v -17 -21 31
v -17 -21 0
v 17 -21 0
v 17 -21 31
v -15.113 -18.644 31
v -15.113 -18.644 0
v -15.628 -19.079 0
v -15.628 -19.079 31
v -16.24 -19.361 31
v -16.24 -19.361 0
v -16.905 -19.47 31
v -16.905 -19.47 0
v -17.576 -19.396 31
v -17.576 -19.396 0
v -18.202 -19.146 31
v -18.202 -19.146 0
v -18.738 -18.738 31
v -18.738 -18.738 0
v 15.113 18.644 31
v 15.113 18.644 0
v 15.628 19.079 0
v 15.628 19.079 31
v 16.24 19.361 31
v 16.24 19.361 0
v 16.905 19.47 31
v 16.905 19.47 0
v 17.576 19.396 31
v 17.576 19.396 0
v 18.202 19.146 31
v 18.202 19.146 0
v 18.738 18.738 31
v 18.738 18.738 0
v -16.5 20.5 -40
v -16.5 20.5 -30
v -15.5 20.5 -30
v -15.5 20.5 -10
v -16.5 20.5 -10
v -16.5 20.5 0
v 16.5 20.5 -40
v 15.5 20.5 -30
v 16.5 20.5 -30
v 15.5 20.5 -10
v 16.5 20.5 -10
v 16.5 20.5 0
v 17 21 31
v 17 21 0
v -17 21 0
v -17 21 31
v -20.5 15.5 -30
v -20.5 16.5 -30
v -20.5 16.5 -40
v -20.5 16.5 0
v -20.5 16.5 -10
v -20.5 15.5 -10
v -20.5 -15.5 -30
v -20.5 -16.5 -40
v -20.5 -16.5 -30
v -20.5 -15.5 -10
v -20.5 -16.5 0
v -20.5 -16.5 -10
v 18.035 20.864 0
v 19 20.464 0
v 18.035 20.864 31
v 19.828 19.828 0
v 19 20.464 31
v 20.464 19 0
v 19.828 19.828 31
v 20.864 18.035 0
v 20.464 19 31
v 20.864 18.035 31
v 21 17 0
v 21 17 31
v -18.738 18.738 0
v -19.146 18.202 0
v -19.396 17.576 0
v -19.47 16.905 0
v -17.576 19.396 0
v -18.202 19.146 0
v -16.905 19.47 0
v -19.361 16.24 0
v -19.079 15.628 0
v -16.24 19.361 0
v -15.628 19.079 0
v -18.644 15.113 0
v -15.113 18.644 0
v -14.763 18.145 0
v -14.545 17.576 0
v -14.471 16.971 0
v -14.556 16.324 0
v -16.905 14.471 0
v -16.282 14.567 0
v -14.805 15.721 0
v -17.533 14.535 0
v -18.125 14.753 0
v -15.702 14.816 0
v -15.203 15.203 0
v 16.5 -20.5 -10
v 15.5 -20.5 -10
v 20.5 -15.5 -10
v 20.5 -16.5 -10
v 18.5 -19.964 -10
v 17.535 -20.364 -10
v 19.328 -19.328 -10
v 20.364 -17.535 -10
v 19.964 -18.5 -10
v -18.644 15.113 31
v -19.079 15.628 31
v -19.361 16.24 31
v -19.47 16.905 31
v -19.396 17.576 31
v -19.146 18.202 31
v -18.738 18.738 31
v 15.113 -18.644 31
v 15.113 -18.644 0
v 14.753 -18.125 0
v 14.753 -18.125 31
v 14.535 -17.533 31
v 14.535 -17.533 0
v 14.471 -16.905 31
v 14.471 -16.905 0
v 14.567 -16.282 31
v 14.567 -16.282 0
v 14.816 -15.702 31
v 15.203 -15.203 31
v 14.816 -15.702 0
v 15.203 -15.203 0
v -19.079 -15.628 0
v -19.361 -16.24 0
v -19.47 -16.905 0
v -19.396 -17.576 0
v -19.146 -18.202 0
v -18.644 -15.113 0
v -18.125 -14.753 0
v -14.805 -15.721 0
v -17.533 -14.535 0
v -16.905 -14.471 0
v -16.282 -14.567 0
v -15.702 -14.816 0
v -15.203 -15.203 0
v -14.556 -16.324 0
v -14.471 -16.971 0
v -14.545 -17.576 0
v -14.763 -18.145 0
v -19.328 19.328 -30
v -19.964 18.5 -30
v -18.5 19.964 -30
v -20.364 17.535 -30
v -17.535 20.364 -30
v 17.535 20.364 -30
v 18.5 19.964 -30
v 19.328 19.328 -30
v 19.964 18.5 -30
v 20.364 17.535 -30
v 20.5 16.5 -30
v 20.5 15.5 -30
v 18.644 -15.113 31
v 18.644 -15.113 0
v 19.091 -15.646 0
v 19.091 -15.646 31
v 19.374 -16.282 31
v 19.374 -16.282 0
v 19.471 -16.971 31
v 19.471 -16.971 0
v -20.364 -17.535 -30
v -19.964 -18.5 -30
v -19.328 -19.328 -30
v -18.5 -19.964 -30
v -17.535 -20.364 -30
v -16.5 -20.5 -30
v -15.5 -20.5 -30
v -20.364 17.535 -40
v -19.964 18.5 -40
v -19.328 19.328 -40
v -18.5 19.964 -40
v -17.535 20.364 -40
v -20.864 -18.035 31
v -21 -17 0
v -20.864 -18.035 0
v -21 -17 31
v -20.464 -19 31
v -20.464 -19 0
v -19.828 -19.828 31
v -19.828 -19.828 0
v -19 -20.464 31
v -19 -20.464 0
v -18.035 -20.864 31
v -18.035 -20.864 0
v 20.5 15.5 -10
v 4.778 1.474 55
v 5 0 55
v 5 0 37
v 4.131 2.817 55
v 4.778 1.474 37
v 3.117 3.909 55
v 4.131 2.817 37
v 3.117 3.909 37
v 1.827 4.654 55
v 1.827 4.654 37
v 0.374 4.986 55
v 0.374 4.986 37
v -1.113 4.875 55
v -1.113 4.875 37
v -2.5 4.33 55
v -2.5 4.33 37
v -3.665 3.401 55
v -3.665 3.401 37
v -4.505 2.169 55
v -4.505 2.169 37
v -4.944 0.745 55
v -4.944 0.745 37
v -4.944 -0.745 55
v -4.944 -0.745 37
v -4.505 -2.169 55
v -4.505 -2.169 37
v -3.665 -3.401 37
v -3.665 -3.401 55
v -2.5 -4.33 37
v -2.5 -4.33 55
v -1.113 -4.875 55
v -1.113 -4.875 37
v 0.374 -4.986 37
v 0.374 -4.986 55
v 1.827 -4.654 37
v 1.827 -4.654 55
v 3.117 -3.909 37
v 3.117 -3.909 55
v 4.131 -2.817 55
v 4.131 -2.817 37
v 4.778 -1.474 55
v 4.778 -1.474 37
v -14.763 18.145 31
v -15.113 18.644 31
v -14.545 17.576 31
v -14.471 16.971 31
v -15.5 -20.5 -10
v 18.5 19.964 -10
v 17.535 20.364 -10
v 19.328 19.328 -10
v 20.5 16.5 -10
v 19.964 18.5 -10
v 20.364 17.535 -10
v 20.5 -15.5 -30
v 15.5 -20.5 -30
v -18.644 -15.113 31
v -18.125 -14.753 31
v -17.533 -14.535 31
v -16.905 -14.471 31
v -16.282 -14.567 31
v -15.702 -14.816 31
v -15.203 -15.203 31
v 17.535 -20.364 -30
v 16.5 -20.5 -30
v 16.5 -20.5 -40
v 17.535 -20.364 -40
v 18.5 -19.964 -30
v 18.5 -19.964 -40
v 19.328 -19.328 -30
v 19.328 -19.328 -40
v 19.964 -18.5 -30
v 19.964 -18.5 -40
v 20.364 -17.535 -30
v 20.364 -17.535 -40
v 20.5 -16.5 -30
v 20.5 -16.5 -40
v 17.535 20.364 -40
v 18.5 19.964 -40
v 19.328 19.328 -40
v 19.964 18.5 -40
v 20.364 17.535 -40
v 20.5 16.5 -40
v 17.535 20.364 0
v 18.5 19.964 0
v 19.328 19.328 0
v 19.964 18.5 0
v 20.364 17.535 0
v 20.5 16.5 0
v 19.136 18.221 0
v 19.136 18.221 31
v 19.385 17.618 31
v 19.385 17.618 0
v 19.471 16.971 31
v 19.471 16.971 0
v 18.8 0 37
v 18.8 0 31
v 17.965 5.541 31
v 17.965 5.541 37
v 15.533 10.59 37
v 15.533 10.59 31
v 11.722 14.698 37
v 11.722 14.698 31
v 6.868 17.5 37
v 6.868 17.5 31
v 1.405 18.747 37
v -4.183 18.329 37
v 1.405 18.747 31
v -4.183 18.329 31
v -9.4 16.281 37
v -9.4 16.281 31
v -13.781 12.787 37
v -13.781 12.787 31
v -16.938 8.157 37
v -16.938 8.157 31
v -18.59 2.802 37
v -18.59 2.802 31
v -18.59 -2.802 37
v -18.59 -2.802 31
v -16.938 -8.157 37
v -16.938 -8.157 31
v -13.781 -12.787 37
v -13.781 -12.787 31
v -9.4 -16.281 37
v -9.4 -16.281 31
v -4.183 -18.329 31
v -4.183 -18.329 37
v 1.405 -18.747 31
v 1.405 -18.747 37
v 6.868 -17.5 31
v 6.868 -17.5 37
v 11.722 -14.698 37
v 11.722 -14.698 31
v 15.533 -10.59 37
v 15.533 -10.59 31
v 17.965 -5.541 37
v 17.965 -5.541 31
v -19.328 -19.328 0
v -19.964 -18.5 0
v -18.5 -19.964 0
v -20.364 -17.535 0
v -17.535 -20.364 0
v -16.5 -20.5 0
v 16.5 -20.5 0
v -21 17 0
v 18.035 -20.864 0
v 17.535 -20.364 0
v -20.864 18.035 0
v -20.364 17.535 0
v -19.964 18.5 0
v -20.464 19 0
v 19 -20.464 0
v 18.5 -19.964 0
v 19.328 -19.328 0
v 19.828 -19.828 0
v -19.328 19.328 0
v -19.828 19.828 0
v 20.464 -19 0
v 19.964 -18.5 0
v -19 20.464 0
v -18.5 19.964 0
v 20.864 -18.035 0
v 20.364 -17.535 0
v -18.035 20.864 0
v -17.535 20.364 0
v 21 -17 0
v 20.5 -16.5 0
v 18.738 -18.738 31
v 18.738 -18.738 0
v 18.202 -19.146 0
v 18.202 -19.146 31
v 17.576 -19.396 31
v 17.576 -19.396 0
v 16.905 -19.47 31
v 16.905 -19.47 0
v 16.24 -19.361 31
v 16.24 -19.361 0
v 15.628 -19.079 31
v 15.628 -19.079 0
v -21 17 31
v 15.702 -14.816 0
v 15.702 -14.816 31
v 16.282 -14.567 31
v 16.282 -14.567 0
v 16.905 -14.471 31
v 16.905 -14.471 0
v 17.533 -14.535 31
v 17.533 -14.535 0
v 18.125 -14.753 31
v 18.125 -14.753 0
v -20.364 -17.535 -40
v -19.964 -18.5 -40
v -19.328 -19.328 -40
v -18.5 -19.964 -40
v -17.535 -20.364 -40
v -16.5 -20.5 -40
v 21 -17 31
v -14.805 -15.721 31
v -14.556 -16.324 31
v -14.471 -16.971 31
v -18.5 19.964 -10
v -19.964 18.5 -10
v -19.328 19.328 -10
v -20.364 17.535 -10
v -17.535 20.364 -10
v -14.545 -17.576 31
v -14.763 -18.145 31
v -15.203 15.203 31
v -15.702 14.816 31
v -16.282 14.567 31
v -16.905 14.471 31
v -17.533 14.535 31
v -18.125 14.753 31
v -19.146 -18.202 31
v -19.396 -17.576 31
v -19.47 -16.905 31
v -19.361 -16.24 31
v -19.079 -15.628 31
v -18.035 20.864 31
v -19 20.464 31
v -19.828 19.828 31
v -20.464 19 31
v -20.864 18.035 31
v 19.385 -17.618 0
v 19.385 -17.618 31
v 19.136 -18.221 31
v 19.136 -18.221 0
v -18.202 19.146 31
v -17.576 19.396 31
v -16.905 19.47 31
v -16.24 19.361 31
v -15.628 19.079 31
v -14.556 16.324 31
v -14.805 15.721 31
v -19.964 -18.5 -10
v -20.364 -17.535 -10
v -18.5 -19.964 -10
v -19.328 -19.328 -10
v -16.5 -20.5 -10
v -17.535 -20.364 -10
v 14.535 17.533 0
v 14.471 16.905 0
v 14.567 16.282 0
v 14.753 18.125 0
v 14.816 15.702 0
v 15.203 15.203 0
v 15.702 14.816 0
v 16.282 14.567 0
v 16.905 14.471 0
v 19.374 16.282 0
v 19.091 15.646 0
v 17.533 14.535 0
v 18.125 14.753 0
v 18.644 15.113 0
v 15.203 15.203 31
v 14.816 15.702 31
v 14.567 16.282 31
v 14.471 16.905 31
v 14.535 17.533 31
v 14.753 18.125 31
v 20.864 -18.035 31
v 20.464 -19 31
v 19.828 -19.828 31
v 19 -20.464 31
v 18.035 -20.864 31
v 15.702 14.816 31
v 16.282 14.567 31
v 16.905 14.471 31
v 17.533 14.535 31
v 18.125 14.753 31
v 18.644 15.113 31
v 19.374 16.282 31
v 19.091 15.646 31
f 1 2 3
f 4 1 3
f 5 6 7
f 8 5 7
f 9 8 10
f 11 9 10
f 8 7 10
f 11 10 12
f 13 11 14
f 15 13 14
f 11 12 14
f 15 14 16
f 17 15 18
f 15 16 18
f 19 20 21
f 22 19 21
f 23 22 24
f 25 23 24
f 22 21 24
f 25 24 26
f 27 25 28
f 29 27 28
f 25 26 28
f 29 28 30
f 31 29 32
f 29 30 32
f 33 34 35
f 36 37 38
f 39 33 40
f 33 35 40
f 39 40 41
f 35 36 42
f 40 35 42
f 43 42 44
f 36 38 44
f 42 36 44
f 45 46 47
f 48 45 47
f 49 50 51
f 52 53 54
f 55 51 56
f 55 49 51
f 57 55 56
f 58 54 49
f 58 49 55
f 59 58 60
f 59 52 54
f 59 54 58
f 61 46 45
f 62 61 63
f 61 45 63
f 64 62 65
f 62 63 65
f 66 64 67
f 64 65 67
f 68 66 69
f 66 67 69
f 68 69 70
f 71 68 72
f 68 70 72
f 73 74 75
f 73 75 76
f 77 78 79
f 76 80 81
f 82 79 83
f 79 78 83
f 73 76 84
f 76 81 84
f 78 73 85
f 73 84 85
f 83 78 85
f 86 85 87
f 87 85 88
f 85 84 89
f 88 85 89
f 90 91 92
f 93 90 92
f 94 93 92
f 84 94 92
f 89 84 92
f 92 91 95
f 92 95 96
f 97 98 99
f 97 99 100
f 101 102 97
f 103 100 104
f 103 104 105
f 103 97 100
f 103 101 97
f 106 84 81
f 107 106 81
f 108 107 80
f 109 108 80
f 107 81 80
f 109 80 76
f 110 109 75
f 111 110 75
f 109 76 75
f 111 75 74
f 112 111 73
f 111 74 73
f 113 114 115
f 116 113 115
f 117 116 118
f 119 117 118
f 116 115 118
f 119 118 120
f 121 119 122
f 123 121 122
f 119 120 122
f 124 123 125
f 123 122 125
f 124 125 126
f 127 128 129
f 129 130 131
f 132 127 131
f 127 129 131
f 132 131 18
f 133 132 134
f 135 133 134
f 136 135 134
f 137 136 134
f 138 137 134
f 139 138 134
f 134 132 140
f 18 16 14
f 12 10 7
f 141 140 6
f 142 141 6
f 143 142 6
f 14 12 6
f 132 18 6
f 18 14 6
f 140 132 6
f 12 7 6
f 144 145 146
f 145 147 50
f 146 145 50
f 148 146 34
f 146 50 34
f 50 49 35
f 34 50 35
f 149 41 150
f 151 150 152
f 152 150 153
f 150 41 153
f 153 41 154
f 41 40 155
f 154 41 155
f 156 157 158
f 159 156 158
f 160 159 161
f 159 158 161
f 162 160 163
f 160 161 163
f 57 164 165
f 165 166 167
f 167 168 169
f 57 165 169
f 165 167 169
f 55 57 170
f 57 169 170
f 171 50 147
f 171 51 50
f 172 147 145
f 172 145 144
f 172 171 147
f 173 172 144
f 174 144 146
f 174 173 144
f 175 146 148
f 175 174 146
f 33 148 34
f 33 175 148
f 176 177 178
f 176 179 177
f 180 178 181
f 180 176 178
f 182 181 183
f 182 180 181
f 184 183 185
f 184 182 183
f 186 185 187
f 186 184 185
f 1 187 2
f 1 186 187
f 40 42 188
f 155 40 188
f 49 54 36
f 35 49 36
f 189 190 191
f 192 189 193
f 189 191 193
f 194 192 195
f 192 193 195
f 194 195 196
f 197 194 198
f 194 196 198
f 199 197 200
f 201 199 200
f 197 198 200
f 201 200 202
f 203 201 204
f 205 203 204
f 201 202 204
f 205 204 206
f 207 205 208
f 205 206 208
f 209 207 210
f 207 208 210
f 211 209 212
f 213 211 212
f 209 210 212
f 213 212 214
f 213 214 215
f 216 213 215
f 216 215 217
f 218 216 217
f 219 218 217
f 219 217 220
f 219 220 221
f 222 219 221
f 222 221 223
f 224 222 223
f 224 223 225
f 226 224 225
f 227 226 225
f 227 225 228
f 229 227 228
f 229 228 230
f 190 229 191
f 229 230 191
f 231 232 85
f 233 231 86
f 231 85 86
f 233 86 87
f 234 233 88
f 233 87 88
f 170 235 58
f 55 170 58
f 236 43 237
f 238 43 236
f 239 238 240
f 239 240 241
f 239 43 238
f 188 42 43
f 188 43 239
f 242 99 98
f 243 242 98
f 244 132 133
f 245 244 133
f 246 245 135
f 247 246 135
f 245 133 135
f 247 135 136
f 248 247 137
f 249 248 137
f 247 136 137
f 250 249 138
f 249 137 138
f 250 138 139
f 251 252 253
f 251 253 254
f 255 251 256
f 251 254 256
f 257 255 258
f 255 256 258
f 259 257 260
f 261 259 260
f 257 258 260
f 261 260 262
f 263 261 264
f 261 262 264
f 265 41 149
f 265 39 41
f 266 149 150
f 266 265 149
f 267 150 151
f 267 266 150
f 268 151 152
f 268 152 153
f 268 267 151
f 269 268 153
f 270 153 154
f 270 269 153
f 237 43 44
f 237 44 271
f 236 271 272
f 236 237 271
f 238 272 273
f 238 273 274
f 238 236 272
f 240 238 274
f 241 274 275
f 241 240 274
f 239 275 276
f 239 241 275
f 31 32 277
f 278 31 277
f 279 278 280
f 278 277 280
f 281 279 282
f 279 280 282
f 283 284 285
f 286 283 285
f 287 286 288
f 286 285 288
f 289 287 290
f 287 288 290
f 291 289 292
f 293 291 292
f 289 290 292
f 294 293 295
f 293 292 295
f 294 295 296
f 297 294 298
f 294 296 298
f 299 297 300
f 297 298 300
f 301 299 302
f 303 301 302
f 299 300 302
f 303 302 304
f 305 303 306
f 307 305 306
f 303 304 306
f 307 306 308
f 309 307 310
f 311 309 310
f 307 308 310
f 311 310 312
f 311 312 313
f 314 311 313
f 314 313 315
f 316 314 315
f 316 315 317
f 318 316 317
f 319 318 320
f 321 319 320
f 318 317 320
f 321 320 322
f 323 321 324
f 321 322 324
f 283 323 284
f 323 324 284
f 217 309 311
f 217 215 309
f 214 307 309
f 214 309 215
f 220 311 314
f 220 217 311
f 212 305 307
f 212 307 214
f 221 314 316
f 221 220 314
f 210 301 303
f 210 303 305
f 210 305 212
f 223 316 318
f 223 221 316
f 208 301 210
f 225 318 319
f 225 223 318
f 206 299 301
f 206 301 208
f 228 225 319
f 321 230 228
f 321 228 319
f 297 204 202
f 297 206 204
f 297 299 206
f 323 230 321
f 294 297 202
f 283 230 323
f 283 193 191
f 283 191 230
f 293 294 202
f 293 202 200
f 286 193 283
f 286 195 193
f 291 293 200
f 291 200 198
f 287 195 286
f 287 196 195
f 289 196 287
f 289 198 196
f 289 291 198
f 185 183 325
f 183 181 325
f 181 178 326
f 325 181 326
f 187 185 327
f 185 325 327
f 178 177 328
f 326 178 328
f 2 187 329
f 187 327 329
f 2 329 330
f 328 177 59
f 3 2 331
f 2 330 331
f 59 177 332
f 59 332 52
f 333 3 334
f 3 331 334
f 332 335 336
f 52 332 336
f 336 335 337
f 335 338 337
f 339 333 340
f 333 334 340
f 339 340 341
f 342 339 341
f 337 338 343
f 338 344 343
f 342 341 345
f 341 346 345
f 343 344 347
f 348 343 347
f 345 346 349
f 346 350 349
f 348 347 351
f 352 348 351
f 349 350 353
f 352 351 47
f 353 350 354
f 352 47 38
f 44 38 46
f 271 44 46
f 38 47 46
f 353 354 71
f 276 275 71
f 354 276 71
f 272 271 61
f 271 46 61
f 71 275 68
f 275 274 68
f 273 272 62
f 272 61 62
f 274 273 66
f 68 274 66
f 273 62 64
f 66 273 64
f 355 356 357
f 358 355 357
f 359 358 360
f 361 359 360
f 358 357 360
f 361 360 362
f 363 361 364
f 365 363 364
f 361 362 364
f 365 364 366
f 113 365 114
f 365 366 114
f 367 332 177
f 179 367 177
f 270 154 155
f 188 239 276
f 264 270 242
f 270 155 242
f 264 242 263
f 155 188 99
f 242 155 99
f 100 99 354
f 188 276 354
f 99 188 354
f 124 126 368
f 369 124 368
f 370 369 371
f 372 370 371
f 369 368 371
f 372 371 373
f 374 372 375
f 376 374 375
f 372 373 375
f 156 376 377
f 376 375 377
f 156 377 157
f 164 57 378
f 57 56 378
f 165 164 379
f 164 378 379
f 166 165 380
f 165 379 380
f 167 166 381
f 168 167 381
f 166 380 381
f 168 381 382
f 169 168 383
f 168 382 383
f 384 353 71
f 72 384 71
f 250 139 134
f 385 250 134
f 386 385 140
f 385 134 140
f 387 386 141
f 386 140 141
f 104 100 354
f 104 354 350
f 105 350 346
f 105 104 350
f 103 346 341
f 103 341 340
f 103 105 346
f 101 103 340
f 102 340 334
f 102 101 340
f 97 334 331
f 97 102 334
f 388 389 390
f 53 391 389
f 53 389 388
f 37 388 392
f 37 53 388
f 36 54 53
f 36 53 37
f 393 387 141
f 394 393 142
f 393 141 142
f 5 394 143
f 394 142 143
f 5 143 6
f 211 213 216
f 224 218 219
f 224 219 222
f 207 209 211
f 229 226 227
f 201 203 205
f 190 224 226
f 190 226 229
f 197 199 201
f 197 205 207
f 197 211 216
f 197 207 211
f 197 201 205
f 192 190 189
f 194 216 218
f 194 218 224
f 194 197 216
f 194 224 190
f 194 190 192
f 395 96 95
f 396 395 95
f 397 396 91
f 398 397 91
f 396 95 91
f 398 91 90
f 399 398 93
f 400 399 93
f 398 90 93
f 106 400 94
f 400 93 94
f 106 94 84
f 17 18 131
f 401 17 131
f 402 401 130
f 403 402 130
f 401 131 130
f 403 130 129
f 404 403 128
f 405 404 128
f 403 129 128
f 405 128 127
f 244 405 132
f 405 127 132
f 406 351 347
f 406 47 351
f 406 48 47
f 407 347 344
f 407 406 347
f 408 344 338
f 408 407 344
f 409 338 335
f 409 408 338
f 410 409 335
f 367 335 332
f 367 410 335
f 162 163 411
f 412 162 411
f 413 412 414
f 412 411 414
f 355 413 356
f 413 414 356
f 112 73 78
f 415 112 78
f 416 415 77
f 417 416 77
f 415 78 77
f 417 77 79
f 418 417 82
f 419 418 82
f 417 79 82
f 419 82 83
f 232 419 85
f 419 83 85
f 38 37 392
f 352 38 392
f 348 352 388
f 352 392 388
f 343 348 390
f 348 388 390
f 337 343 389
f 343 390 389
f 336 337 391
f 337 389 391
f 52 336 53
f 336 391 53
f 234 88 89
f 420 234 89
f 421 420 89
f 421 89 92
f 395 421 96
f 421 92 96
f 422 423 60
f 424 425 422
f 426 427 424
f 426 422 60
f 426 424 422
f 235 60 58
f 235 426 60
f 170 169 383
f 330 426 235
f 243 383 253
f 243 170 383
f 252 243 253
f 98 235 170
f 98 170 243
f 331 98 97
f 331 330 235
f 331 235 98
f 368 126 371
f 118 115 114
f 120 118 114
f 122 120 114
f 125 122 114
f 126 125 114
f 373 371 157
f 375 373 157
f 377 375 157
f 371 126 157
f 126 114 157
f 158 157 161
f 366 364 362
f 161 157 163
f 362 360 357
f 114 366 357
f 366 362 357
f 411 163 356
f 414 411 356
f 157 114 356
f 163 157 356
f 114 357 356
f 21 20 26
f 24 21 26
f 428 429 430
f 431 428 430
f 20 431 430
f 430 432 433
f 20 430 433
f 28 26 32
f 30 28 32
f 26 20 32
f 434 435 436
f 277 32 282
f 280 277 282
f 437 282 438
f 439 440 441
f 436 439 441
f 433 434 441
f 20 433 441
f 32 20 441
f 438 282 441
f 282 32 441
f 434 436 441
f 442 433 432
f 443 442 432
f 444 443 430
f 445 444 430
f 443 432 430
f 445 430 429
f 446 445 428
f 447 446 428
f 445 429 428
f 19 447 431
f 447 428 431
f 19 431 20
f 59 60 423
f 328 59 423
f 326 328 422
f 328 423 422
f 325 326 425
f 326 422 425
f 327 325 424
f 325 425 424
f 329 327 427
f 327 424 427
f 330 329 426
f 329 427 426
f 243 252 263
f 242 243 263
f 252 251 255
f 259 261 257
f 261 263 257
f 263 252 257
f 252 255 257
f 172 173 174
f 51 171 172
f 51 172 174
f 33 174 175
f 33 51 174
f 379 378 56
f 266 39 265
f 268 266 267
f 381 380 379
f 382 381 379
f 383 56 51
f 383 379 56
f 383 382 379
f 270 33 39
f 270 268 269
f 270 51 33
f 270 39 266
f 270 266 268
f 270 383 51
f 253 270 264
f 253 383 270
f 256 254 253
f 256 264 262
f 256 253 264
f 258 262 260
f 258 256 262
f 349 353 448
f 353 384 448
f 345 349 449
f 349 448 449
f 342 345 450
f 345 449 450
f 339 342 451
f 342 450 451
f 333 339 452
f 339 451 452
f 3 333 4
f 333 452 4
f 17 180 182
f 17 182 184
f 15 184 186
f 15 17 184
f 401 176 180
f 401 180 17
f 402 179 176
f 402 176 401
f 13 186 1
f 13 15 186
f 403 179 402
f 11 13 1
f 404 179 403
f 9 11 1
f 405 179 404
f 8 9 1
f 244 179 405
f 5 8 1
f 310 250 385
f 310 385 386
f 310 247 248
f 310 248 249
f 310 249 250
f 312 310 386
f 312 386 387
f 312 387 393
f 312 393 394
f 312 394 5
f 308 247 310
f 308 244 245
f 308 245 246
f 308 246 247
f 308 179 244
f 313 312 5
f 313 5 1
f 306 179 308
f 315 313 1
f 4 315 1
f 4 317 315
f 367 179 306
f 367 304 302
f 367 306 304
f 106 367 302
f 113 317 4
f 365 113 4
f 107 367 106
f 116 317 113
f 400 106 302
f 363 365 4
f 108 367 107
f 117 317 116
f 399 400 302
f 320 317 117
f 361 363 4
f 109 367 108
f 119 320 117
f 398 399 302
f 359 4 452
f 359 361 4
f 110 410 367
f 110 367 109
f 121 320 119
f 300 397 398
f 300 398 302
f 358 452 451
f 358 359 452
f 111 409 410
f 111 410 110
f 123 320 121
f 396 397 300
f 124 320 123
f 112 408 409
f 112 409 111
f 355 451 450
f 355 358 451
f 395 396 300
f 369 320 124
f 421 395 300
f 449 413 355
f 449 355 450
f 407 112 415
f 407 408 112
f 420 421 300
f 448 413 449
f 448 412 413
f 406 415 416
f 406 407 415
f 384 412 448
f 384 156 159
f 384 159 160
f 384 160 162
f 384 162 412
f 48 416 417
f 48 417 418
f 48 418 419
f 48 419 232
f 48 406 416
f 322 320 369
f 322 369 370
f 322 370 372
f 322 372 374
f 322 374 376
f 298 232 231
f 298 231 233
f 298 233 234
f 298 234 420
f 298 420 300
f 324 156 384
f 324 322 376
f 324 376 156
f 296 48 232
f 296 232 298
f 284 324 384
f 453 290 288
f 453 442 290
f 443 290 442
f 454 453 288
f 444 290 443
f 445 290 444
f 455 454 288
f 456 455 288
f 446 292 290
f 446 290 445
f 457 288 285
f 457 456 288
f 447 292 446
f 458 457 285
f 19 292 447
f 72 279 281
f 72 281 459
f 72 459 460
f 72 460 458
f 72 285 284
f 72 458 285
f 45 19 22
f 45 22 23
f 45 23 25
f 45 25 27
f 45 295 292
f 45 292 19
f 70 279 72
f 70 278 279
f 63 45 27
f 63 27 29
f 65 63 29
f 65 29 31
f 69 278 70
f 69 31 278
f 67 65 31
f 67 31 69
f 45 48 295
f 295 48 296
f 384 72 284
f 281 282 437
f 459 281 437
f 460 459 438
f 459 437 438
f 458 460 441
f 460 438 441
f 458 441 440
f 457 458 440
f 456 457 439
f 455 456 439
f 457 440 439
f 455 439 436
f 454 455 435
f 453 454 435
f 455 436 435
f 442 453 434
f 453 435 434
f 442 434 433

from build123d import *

# Parameters (mm, degrees)
F1_DEPTH     = 31
F2_R         = 18.8
F3_DEPTH     = 6
F4_R         = 5
F5_DEPTH     = 18
F6_R         = 4
F8_W         = 41
F8_H         = 41
F9_DEPTH     = 10
F10_T1_DEPTH = 20
F12_DEPTH    = 20
F13_W        = 41
F13_H        = 41
F14_DEPTH    = 10
F15_R        = 4


# Not quite as in the source:
# - a fillet or chamfer that OpenCascade refuses, or shapes differently, is made with other operations: its cross-section is extruded or revolved along the edge and cut away or added


with BuildPart() as f1:
    # F0 (on Top) → F1 (new body)
    with BuildSketch(Plane.XY):
        with BuildLine():
            Line((18.7383297014, 18.7383297014), (21, 21))
            Line((21, 21), (11.6189500386, 21))
            ThreePointArc((11.6189500386, 21), (13.4178535673, 19.8987739735), (15.1131239157, 18.6438591903))
            ThreePointArc((15.1131239157, 18.6438591903), (16.9054364798, 19.4697143183), (18.7383297014, 18.7383297014))
        make_face()
        with BuildLine():
            ThreePointArc((-15.1131239157, 18.6438591903), (-13.4178535673, 19.8987739735), (-11.6189500386, 21))
            Line((-11.6189500386, 21), (-21, 21))
            Line((-21, 21), (-18.7383297014, 18.7383297014))
            ThreePointArc((-18.7383297014, 18.7383297014), (-16.9054364798, 19.4697143183), (-15.1131239157, 18.6438591903))
        make_face()
        with BuildLine():
            Line((11.6189500386, -21), (21, -21))
            Line((21, -21), (18.7383297014, -18.7383297014))
            ThreePointArc((18.7383297014, -18.7383297014), (16.9054364798, -19.4697143183), (15.1131239157, -18.6438591903))
            ThreePointArc((15.1131239157, -18.6438591903), (13.4178535673, -19.8987739735), (11.6189500386, -21))
        make_face()
        with BuildLine():
            Line((-21, -21), (-11.6189500386, -21))
            ThreePointArc((-11.6189500386, -21), (-13.4178535673, -19.8987739735), (-15.1131239157, -18.6438591903))
            ThreePointArc((-15.1131239157, -18.6438591903), (-16.9054364798, -19.4697143183), (-18.7383297014, -18.7383297014))
            Line((-18.7383297014, -18.7383297014), (-21, -21))
        make_face()
        with BuildLine():
            Line((21, 11.6189500386), (21, 21))
            Line((21, 21), (18.7383297014, 18.7383297014))
            ThreePointArc((18.7383297014, 18.7383297014), (19.2802615798, 17.9272713294), (19.4705627485, 16.9705627485))
            ThreePointArc((19.4705627485, 16.9705627485), (19.2545549885, 15.954010021), (18.6438591903, 15.1131239157))
            ThreePointArc((18.6438591903, 15.1131239157), (19.8987739735, 13.4178535673), (21, 11.6189500386))
        make_face()
        with BuildLine():
            Line((21, -21), (21, -11.6189500386))
            ThreePointArc((21, -11.6189500386), (19.8987739735, -13.4178535673), (18.6438591903, -15.1131239157))
            ThreePointArc((18.6438591903, -15.1131239157), (19.2545549885, -15.954010021), (19.4705627485, -16.9705627485))
            ThreePointArc((19.4705627485, -16.9705627485), (19.2802615798, -17.9272713294), (18.7383297014, -18.7383297014))
            Line((18.7383297014, -18.7383297014), (21, -21))
        make_face()
        with BuildLine():
            Line((-18.7383297014, 18.7383297014), (-21, 21))
            Line((-21, 21), (-21, 11.6189500386))
            ThreePointArc((-21, 11.6189500386), (-19.8987739735, 13.4178535673), (-18.6438591903, 15.1131239157))
            ThreePointArc((-18.6438591903, 15.1131239157), (-19.4697143183, 16.9054364798), (-18.7383297014, 18.7383297014))
        make_face()
        with BuildLine():
            ThreePointArc((-18.6438591903, -15.1131239157), (-19.8987739735, -13.4178535673), (-21, -11.6189500386))
            Line((-21, -11.6189500386), (-21, -21))
            Line((-21, -21), (-18.7383297014, -18.7383297014))
            ThreePointArc((-18.7383297014, -18.7383297014), (-19.4697143183, -16.9054364798), (-18.6438591903, -15.1131239157))
        make_face()
        with BuildLine():
            ThreePointArc((15.1131239157, 18.6438591903), (13.4178535673, 19.8987739735), (11.6189500386, 21))
            Line((11.6189500386, 21), (-11.6189500386, 21))
            ThreePointArc((-11.6189500386, 21), (-13.4178535673, 19.8987739735), (-15.1131239157, 18.6438591903))
            ThreePointArc((-15.1131239157, 18.6438591903), (-14.6367250204, 17.8667778225), (-14.4705627485, 16.9705627485))
            ThreePointArc((-14.4705627485, 16.9705627485), (-14.6608639172, 16.0138541676), (-15.2027957955, 15.2027957955))
            Line((-15.2027957955, 15.2027957955), (0, 0))
            Line((0, 0), (15.2027957955, 15.2027957955))
            ThreePointArc((15.2027957955, 15.2027957955), (14.4714111786, 16.9054364798), (15.1131239157, 18.6438591903))
        make_face()
        with BuildLine():
            Line((15.2027957955, -15.2027957955), (0, 0))
            Line((0, 0), (-15.2027957955, -15.2027957955))
            ThreePointArc((-15.2027957955, -15.2027957955), (-14.6608639172, -16.0138541676), (-14.4705627485, -16.9705627485))
            ThreePointArc((-14.4705627485, -16.9705627485), (-14.6367250204, -17.8667778225), (-15.1131239157, -18.6438591903))
            ThreePointArc((-15.1131239157, -18.6438591903), (-13.4178535673, -19.8987739735), (-11.6189500386, -21))
            Line((-11.6189500386, -21), (11.6189500386, -21))
            ThreePointArc((11.6189500386, -21), (13.4178535673, -19.8987739735), (15.1131239157, -18.6438591903))
            ThreePointArc((15.1131239157, -18.6438591903), (14.4714111786, -16.9054364798), (15.2027957955, -15.2027957955))
        make_face()
        with BuildLine():
            Line((21, -11.6189500386), (21, 11.6189500386))
            ThreePointArc((21, 11.6189500386), (19.8987739735, 13.4178535673), (18.6438591903, 15.1131239157))
            ThreePointArc((18.6438591903, 15.1131239157), (16.9054364798, 14.4714111786), (15.2027957955, 15.2027957955))
            Line((15.2027957955, 15.2027957955), (0, 0))
            Line((0, 0), (15.2027957955, -15.2027957955))
            ThreePointArc((15.2027957955, -15.2027957955), (16.9054364798, -14.4714111786), (18.6438591903, -15.1131239157))
            ThreePointArc((18.6438591903, -15.1131239157), (19.8987739735, -13.4178535673), (21, -11.6189500386))
        make_face()
        with BuildLine():
            ThreePointArc((-18.6438591903, 15.1131239157), (-19.8987739735, 13.4178535673), (-21, 11.6189500386))
            Line((-21, 11.6189500386), (-21, -11.6189500386))
            ThreePointArc((-21, -11.6189500386), (-19.8987739735, -13.4178535673), (-18.6438591903, -15.1131239157))
            ThreePointArc((-18.6438591903, -15.1131239157), (-16.9054364798, -14.4714111786), (-15.2027957955, -15.2027957955))
            Line((-15.2027957955, -15.2027957955), (0, 0))
            Line((0, 0), (-15.2027957955, 15.2027957955))
            ThreePointArc((-15.2027957955, 15.2027957955), (-16.9054364798, 14.4714111786), (-18.6438591903, 15.1131239157))
        make_face()
    extrude(amount=F1_DEPTH)

    # F2 (on face) → F3 (join)
    with BuildSketch(Plane.XY.offset(31)):
        Circle(F2_R)
    extrude(amount=F3_DEPTH)

    # F4 (on face) → F5 (join)
    with BuildSketch(Plane.XY.offset(37)):
        Circle(F4_R)
    extrude(amount=F5_DEPTH)

    # F6
    f6_edges = [f1.edges().sort_by_distance(p)[0] for p in [
        (-21, -21, 15.5),
        (-21, 21, 15.5),
        (21, 21, 15.5),
        (21, -21, 15.5),
    ]]
    fillet(f6_edges, radius=F6_R)

    # F8 (on face) → F9 (join)
    with BuildSketch(Plane(origin=(0, 0, 0), x_dir=(1, 0, 0), z_dir=(0, 0, -1))):
        Rectangle(F8_W, F8_H)
    extrude(amount=F9_DEPTH)

    # F10: fillet of radius 4 on 4 edges, made by hand

    # F10_s2 → F10_t1 (cut)
    with BuildSketch(Plane.XY.offset(-20)):
        with BuildLine():
            ThreePointArc((20.5, -16.5), (19.3284271247, -19.3284271247), (16.5, -20.5))
            Line((16.5, -20.5), (20.5, -20.5))
            Line((20.5, -20.5), (20.5, -16.5))
        make_face()
        with BuildLine():
            ThreePointArc((16.5, 20.5), (19.3284271247, 19.3284271247), (20.5, 16.5))
            Line((20.5, 16.5), (20.5, 20.5))
            Line((20.5, 20.5), (16.5, 20.5))
        make_face()
        with BuildLine():
            ThreePointArc((-16.5, 20.5), (-19.3284271247, 19.3284271247), (-20.5, 16.5))
            Line((-20.5, 16.5), (-20.5, 20.5))
            Line((-20.5, 20.5), (-16.5, 20.5))
        make_face()
        with BuildLine():
            ThreePointArc((-20.5, -16.5), (-19.3284271247, -19.3284271247), (-16.5, -20.5))
            Line((-16.5, -20.5), (-20.5, -20.5))
            Line((-20.5, -20.5), (-20.5, -16.5))
        make_face()
    extrude(amount=F10_T1_DEPTH, mode=Mode.SUBTRACT)

    # F11 (on face) → F12 (join)
    with BuildSketch(Plane(origin=(0, 0, -10), x_dir=(1, 0, 0), z_dir=(0, 0, -1))):
        Polygon((-15.5, 20.5), (-20.5, 15.5), (-15.5, 15.5), align=None)
        Polygon((15.5, 15.5), (20.5, 15.5), (15.5, 20.5), align=None)
        Polygon((15.5, -15.5), (15.5, -20.5), (20.5, -15.5), align=None)
        Polygon((-20.5, -15.5), (-15.5, -20.5), (-15.5, -15.5), align=None)
        Polygon((-15.5, -20.5), (15.5, -20.5), (15.5, -15.5), (20.5, -15.5), (20.5, 15.5), (15.5, 15.5), (15.5, 20.5), (-15.5, 20.5), (-15.5, 15.5), (-20.5, 15.5), (-20.5, -15.5), (-15.5, -15.5), align=None)
    extrude(amount=F12_DEPTH)

    # F13 (on face) → F14 (join)
    with BuildSketch(Plane(origin=(0, 0, -30), x_dir=(1, 0, 0), z_dir=(0, 0, -1))):
        Rectangle(F13_W, F13_H)
    extrude(amount=F14_DEPTH)

    # F15
    f15_edges = [f1.edges().sort_by_distance(p)[0] for p in [
        (20.5, -20.5, -35),
        (-20.5, -20.5, -35),
        (20.5, 20.5, -35),
        (-20.5, 20.5, -35),
    ]]
    fillet(f15_edges, radius=F15_R)


solid = f1.part
